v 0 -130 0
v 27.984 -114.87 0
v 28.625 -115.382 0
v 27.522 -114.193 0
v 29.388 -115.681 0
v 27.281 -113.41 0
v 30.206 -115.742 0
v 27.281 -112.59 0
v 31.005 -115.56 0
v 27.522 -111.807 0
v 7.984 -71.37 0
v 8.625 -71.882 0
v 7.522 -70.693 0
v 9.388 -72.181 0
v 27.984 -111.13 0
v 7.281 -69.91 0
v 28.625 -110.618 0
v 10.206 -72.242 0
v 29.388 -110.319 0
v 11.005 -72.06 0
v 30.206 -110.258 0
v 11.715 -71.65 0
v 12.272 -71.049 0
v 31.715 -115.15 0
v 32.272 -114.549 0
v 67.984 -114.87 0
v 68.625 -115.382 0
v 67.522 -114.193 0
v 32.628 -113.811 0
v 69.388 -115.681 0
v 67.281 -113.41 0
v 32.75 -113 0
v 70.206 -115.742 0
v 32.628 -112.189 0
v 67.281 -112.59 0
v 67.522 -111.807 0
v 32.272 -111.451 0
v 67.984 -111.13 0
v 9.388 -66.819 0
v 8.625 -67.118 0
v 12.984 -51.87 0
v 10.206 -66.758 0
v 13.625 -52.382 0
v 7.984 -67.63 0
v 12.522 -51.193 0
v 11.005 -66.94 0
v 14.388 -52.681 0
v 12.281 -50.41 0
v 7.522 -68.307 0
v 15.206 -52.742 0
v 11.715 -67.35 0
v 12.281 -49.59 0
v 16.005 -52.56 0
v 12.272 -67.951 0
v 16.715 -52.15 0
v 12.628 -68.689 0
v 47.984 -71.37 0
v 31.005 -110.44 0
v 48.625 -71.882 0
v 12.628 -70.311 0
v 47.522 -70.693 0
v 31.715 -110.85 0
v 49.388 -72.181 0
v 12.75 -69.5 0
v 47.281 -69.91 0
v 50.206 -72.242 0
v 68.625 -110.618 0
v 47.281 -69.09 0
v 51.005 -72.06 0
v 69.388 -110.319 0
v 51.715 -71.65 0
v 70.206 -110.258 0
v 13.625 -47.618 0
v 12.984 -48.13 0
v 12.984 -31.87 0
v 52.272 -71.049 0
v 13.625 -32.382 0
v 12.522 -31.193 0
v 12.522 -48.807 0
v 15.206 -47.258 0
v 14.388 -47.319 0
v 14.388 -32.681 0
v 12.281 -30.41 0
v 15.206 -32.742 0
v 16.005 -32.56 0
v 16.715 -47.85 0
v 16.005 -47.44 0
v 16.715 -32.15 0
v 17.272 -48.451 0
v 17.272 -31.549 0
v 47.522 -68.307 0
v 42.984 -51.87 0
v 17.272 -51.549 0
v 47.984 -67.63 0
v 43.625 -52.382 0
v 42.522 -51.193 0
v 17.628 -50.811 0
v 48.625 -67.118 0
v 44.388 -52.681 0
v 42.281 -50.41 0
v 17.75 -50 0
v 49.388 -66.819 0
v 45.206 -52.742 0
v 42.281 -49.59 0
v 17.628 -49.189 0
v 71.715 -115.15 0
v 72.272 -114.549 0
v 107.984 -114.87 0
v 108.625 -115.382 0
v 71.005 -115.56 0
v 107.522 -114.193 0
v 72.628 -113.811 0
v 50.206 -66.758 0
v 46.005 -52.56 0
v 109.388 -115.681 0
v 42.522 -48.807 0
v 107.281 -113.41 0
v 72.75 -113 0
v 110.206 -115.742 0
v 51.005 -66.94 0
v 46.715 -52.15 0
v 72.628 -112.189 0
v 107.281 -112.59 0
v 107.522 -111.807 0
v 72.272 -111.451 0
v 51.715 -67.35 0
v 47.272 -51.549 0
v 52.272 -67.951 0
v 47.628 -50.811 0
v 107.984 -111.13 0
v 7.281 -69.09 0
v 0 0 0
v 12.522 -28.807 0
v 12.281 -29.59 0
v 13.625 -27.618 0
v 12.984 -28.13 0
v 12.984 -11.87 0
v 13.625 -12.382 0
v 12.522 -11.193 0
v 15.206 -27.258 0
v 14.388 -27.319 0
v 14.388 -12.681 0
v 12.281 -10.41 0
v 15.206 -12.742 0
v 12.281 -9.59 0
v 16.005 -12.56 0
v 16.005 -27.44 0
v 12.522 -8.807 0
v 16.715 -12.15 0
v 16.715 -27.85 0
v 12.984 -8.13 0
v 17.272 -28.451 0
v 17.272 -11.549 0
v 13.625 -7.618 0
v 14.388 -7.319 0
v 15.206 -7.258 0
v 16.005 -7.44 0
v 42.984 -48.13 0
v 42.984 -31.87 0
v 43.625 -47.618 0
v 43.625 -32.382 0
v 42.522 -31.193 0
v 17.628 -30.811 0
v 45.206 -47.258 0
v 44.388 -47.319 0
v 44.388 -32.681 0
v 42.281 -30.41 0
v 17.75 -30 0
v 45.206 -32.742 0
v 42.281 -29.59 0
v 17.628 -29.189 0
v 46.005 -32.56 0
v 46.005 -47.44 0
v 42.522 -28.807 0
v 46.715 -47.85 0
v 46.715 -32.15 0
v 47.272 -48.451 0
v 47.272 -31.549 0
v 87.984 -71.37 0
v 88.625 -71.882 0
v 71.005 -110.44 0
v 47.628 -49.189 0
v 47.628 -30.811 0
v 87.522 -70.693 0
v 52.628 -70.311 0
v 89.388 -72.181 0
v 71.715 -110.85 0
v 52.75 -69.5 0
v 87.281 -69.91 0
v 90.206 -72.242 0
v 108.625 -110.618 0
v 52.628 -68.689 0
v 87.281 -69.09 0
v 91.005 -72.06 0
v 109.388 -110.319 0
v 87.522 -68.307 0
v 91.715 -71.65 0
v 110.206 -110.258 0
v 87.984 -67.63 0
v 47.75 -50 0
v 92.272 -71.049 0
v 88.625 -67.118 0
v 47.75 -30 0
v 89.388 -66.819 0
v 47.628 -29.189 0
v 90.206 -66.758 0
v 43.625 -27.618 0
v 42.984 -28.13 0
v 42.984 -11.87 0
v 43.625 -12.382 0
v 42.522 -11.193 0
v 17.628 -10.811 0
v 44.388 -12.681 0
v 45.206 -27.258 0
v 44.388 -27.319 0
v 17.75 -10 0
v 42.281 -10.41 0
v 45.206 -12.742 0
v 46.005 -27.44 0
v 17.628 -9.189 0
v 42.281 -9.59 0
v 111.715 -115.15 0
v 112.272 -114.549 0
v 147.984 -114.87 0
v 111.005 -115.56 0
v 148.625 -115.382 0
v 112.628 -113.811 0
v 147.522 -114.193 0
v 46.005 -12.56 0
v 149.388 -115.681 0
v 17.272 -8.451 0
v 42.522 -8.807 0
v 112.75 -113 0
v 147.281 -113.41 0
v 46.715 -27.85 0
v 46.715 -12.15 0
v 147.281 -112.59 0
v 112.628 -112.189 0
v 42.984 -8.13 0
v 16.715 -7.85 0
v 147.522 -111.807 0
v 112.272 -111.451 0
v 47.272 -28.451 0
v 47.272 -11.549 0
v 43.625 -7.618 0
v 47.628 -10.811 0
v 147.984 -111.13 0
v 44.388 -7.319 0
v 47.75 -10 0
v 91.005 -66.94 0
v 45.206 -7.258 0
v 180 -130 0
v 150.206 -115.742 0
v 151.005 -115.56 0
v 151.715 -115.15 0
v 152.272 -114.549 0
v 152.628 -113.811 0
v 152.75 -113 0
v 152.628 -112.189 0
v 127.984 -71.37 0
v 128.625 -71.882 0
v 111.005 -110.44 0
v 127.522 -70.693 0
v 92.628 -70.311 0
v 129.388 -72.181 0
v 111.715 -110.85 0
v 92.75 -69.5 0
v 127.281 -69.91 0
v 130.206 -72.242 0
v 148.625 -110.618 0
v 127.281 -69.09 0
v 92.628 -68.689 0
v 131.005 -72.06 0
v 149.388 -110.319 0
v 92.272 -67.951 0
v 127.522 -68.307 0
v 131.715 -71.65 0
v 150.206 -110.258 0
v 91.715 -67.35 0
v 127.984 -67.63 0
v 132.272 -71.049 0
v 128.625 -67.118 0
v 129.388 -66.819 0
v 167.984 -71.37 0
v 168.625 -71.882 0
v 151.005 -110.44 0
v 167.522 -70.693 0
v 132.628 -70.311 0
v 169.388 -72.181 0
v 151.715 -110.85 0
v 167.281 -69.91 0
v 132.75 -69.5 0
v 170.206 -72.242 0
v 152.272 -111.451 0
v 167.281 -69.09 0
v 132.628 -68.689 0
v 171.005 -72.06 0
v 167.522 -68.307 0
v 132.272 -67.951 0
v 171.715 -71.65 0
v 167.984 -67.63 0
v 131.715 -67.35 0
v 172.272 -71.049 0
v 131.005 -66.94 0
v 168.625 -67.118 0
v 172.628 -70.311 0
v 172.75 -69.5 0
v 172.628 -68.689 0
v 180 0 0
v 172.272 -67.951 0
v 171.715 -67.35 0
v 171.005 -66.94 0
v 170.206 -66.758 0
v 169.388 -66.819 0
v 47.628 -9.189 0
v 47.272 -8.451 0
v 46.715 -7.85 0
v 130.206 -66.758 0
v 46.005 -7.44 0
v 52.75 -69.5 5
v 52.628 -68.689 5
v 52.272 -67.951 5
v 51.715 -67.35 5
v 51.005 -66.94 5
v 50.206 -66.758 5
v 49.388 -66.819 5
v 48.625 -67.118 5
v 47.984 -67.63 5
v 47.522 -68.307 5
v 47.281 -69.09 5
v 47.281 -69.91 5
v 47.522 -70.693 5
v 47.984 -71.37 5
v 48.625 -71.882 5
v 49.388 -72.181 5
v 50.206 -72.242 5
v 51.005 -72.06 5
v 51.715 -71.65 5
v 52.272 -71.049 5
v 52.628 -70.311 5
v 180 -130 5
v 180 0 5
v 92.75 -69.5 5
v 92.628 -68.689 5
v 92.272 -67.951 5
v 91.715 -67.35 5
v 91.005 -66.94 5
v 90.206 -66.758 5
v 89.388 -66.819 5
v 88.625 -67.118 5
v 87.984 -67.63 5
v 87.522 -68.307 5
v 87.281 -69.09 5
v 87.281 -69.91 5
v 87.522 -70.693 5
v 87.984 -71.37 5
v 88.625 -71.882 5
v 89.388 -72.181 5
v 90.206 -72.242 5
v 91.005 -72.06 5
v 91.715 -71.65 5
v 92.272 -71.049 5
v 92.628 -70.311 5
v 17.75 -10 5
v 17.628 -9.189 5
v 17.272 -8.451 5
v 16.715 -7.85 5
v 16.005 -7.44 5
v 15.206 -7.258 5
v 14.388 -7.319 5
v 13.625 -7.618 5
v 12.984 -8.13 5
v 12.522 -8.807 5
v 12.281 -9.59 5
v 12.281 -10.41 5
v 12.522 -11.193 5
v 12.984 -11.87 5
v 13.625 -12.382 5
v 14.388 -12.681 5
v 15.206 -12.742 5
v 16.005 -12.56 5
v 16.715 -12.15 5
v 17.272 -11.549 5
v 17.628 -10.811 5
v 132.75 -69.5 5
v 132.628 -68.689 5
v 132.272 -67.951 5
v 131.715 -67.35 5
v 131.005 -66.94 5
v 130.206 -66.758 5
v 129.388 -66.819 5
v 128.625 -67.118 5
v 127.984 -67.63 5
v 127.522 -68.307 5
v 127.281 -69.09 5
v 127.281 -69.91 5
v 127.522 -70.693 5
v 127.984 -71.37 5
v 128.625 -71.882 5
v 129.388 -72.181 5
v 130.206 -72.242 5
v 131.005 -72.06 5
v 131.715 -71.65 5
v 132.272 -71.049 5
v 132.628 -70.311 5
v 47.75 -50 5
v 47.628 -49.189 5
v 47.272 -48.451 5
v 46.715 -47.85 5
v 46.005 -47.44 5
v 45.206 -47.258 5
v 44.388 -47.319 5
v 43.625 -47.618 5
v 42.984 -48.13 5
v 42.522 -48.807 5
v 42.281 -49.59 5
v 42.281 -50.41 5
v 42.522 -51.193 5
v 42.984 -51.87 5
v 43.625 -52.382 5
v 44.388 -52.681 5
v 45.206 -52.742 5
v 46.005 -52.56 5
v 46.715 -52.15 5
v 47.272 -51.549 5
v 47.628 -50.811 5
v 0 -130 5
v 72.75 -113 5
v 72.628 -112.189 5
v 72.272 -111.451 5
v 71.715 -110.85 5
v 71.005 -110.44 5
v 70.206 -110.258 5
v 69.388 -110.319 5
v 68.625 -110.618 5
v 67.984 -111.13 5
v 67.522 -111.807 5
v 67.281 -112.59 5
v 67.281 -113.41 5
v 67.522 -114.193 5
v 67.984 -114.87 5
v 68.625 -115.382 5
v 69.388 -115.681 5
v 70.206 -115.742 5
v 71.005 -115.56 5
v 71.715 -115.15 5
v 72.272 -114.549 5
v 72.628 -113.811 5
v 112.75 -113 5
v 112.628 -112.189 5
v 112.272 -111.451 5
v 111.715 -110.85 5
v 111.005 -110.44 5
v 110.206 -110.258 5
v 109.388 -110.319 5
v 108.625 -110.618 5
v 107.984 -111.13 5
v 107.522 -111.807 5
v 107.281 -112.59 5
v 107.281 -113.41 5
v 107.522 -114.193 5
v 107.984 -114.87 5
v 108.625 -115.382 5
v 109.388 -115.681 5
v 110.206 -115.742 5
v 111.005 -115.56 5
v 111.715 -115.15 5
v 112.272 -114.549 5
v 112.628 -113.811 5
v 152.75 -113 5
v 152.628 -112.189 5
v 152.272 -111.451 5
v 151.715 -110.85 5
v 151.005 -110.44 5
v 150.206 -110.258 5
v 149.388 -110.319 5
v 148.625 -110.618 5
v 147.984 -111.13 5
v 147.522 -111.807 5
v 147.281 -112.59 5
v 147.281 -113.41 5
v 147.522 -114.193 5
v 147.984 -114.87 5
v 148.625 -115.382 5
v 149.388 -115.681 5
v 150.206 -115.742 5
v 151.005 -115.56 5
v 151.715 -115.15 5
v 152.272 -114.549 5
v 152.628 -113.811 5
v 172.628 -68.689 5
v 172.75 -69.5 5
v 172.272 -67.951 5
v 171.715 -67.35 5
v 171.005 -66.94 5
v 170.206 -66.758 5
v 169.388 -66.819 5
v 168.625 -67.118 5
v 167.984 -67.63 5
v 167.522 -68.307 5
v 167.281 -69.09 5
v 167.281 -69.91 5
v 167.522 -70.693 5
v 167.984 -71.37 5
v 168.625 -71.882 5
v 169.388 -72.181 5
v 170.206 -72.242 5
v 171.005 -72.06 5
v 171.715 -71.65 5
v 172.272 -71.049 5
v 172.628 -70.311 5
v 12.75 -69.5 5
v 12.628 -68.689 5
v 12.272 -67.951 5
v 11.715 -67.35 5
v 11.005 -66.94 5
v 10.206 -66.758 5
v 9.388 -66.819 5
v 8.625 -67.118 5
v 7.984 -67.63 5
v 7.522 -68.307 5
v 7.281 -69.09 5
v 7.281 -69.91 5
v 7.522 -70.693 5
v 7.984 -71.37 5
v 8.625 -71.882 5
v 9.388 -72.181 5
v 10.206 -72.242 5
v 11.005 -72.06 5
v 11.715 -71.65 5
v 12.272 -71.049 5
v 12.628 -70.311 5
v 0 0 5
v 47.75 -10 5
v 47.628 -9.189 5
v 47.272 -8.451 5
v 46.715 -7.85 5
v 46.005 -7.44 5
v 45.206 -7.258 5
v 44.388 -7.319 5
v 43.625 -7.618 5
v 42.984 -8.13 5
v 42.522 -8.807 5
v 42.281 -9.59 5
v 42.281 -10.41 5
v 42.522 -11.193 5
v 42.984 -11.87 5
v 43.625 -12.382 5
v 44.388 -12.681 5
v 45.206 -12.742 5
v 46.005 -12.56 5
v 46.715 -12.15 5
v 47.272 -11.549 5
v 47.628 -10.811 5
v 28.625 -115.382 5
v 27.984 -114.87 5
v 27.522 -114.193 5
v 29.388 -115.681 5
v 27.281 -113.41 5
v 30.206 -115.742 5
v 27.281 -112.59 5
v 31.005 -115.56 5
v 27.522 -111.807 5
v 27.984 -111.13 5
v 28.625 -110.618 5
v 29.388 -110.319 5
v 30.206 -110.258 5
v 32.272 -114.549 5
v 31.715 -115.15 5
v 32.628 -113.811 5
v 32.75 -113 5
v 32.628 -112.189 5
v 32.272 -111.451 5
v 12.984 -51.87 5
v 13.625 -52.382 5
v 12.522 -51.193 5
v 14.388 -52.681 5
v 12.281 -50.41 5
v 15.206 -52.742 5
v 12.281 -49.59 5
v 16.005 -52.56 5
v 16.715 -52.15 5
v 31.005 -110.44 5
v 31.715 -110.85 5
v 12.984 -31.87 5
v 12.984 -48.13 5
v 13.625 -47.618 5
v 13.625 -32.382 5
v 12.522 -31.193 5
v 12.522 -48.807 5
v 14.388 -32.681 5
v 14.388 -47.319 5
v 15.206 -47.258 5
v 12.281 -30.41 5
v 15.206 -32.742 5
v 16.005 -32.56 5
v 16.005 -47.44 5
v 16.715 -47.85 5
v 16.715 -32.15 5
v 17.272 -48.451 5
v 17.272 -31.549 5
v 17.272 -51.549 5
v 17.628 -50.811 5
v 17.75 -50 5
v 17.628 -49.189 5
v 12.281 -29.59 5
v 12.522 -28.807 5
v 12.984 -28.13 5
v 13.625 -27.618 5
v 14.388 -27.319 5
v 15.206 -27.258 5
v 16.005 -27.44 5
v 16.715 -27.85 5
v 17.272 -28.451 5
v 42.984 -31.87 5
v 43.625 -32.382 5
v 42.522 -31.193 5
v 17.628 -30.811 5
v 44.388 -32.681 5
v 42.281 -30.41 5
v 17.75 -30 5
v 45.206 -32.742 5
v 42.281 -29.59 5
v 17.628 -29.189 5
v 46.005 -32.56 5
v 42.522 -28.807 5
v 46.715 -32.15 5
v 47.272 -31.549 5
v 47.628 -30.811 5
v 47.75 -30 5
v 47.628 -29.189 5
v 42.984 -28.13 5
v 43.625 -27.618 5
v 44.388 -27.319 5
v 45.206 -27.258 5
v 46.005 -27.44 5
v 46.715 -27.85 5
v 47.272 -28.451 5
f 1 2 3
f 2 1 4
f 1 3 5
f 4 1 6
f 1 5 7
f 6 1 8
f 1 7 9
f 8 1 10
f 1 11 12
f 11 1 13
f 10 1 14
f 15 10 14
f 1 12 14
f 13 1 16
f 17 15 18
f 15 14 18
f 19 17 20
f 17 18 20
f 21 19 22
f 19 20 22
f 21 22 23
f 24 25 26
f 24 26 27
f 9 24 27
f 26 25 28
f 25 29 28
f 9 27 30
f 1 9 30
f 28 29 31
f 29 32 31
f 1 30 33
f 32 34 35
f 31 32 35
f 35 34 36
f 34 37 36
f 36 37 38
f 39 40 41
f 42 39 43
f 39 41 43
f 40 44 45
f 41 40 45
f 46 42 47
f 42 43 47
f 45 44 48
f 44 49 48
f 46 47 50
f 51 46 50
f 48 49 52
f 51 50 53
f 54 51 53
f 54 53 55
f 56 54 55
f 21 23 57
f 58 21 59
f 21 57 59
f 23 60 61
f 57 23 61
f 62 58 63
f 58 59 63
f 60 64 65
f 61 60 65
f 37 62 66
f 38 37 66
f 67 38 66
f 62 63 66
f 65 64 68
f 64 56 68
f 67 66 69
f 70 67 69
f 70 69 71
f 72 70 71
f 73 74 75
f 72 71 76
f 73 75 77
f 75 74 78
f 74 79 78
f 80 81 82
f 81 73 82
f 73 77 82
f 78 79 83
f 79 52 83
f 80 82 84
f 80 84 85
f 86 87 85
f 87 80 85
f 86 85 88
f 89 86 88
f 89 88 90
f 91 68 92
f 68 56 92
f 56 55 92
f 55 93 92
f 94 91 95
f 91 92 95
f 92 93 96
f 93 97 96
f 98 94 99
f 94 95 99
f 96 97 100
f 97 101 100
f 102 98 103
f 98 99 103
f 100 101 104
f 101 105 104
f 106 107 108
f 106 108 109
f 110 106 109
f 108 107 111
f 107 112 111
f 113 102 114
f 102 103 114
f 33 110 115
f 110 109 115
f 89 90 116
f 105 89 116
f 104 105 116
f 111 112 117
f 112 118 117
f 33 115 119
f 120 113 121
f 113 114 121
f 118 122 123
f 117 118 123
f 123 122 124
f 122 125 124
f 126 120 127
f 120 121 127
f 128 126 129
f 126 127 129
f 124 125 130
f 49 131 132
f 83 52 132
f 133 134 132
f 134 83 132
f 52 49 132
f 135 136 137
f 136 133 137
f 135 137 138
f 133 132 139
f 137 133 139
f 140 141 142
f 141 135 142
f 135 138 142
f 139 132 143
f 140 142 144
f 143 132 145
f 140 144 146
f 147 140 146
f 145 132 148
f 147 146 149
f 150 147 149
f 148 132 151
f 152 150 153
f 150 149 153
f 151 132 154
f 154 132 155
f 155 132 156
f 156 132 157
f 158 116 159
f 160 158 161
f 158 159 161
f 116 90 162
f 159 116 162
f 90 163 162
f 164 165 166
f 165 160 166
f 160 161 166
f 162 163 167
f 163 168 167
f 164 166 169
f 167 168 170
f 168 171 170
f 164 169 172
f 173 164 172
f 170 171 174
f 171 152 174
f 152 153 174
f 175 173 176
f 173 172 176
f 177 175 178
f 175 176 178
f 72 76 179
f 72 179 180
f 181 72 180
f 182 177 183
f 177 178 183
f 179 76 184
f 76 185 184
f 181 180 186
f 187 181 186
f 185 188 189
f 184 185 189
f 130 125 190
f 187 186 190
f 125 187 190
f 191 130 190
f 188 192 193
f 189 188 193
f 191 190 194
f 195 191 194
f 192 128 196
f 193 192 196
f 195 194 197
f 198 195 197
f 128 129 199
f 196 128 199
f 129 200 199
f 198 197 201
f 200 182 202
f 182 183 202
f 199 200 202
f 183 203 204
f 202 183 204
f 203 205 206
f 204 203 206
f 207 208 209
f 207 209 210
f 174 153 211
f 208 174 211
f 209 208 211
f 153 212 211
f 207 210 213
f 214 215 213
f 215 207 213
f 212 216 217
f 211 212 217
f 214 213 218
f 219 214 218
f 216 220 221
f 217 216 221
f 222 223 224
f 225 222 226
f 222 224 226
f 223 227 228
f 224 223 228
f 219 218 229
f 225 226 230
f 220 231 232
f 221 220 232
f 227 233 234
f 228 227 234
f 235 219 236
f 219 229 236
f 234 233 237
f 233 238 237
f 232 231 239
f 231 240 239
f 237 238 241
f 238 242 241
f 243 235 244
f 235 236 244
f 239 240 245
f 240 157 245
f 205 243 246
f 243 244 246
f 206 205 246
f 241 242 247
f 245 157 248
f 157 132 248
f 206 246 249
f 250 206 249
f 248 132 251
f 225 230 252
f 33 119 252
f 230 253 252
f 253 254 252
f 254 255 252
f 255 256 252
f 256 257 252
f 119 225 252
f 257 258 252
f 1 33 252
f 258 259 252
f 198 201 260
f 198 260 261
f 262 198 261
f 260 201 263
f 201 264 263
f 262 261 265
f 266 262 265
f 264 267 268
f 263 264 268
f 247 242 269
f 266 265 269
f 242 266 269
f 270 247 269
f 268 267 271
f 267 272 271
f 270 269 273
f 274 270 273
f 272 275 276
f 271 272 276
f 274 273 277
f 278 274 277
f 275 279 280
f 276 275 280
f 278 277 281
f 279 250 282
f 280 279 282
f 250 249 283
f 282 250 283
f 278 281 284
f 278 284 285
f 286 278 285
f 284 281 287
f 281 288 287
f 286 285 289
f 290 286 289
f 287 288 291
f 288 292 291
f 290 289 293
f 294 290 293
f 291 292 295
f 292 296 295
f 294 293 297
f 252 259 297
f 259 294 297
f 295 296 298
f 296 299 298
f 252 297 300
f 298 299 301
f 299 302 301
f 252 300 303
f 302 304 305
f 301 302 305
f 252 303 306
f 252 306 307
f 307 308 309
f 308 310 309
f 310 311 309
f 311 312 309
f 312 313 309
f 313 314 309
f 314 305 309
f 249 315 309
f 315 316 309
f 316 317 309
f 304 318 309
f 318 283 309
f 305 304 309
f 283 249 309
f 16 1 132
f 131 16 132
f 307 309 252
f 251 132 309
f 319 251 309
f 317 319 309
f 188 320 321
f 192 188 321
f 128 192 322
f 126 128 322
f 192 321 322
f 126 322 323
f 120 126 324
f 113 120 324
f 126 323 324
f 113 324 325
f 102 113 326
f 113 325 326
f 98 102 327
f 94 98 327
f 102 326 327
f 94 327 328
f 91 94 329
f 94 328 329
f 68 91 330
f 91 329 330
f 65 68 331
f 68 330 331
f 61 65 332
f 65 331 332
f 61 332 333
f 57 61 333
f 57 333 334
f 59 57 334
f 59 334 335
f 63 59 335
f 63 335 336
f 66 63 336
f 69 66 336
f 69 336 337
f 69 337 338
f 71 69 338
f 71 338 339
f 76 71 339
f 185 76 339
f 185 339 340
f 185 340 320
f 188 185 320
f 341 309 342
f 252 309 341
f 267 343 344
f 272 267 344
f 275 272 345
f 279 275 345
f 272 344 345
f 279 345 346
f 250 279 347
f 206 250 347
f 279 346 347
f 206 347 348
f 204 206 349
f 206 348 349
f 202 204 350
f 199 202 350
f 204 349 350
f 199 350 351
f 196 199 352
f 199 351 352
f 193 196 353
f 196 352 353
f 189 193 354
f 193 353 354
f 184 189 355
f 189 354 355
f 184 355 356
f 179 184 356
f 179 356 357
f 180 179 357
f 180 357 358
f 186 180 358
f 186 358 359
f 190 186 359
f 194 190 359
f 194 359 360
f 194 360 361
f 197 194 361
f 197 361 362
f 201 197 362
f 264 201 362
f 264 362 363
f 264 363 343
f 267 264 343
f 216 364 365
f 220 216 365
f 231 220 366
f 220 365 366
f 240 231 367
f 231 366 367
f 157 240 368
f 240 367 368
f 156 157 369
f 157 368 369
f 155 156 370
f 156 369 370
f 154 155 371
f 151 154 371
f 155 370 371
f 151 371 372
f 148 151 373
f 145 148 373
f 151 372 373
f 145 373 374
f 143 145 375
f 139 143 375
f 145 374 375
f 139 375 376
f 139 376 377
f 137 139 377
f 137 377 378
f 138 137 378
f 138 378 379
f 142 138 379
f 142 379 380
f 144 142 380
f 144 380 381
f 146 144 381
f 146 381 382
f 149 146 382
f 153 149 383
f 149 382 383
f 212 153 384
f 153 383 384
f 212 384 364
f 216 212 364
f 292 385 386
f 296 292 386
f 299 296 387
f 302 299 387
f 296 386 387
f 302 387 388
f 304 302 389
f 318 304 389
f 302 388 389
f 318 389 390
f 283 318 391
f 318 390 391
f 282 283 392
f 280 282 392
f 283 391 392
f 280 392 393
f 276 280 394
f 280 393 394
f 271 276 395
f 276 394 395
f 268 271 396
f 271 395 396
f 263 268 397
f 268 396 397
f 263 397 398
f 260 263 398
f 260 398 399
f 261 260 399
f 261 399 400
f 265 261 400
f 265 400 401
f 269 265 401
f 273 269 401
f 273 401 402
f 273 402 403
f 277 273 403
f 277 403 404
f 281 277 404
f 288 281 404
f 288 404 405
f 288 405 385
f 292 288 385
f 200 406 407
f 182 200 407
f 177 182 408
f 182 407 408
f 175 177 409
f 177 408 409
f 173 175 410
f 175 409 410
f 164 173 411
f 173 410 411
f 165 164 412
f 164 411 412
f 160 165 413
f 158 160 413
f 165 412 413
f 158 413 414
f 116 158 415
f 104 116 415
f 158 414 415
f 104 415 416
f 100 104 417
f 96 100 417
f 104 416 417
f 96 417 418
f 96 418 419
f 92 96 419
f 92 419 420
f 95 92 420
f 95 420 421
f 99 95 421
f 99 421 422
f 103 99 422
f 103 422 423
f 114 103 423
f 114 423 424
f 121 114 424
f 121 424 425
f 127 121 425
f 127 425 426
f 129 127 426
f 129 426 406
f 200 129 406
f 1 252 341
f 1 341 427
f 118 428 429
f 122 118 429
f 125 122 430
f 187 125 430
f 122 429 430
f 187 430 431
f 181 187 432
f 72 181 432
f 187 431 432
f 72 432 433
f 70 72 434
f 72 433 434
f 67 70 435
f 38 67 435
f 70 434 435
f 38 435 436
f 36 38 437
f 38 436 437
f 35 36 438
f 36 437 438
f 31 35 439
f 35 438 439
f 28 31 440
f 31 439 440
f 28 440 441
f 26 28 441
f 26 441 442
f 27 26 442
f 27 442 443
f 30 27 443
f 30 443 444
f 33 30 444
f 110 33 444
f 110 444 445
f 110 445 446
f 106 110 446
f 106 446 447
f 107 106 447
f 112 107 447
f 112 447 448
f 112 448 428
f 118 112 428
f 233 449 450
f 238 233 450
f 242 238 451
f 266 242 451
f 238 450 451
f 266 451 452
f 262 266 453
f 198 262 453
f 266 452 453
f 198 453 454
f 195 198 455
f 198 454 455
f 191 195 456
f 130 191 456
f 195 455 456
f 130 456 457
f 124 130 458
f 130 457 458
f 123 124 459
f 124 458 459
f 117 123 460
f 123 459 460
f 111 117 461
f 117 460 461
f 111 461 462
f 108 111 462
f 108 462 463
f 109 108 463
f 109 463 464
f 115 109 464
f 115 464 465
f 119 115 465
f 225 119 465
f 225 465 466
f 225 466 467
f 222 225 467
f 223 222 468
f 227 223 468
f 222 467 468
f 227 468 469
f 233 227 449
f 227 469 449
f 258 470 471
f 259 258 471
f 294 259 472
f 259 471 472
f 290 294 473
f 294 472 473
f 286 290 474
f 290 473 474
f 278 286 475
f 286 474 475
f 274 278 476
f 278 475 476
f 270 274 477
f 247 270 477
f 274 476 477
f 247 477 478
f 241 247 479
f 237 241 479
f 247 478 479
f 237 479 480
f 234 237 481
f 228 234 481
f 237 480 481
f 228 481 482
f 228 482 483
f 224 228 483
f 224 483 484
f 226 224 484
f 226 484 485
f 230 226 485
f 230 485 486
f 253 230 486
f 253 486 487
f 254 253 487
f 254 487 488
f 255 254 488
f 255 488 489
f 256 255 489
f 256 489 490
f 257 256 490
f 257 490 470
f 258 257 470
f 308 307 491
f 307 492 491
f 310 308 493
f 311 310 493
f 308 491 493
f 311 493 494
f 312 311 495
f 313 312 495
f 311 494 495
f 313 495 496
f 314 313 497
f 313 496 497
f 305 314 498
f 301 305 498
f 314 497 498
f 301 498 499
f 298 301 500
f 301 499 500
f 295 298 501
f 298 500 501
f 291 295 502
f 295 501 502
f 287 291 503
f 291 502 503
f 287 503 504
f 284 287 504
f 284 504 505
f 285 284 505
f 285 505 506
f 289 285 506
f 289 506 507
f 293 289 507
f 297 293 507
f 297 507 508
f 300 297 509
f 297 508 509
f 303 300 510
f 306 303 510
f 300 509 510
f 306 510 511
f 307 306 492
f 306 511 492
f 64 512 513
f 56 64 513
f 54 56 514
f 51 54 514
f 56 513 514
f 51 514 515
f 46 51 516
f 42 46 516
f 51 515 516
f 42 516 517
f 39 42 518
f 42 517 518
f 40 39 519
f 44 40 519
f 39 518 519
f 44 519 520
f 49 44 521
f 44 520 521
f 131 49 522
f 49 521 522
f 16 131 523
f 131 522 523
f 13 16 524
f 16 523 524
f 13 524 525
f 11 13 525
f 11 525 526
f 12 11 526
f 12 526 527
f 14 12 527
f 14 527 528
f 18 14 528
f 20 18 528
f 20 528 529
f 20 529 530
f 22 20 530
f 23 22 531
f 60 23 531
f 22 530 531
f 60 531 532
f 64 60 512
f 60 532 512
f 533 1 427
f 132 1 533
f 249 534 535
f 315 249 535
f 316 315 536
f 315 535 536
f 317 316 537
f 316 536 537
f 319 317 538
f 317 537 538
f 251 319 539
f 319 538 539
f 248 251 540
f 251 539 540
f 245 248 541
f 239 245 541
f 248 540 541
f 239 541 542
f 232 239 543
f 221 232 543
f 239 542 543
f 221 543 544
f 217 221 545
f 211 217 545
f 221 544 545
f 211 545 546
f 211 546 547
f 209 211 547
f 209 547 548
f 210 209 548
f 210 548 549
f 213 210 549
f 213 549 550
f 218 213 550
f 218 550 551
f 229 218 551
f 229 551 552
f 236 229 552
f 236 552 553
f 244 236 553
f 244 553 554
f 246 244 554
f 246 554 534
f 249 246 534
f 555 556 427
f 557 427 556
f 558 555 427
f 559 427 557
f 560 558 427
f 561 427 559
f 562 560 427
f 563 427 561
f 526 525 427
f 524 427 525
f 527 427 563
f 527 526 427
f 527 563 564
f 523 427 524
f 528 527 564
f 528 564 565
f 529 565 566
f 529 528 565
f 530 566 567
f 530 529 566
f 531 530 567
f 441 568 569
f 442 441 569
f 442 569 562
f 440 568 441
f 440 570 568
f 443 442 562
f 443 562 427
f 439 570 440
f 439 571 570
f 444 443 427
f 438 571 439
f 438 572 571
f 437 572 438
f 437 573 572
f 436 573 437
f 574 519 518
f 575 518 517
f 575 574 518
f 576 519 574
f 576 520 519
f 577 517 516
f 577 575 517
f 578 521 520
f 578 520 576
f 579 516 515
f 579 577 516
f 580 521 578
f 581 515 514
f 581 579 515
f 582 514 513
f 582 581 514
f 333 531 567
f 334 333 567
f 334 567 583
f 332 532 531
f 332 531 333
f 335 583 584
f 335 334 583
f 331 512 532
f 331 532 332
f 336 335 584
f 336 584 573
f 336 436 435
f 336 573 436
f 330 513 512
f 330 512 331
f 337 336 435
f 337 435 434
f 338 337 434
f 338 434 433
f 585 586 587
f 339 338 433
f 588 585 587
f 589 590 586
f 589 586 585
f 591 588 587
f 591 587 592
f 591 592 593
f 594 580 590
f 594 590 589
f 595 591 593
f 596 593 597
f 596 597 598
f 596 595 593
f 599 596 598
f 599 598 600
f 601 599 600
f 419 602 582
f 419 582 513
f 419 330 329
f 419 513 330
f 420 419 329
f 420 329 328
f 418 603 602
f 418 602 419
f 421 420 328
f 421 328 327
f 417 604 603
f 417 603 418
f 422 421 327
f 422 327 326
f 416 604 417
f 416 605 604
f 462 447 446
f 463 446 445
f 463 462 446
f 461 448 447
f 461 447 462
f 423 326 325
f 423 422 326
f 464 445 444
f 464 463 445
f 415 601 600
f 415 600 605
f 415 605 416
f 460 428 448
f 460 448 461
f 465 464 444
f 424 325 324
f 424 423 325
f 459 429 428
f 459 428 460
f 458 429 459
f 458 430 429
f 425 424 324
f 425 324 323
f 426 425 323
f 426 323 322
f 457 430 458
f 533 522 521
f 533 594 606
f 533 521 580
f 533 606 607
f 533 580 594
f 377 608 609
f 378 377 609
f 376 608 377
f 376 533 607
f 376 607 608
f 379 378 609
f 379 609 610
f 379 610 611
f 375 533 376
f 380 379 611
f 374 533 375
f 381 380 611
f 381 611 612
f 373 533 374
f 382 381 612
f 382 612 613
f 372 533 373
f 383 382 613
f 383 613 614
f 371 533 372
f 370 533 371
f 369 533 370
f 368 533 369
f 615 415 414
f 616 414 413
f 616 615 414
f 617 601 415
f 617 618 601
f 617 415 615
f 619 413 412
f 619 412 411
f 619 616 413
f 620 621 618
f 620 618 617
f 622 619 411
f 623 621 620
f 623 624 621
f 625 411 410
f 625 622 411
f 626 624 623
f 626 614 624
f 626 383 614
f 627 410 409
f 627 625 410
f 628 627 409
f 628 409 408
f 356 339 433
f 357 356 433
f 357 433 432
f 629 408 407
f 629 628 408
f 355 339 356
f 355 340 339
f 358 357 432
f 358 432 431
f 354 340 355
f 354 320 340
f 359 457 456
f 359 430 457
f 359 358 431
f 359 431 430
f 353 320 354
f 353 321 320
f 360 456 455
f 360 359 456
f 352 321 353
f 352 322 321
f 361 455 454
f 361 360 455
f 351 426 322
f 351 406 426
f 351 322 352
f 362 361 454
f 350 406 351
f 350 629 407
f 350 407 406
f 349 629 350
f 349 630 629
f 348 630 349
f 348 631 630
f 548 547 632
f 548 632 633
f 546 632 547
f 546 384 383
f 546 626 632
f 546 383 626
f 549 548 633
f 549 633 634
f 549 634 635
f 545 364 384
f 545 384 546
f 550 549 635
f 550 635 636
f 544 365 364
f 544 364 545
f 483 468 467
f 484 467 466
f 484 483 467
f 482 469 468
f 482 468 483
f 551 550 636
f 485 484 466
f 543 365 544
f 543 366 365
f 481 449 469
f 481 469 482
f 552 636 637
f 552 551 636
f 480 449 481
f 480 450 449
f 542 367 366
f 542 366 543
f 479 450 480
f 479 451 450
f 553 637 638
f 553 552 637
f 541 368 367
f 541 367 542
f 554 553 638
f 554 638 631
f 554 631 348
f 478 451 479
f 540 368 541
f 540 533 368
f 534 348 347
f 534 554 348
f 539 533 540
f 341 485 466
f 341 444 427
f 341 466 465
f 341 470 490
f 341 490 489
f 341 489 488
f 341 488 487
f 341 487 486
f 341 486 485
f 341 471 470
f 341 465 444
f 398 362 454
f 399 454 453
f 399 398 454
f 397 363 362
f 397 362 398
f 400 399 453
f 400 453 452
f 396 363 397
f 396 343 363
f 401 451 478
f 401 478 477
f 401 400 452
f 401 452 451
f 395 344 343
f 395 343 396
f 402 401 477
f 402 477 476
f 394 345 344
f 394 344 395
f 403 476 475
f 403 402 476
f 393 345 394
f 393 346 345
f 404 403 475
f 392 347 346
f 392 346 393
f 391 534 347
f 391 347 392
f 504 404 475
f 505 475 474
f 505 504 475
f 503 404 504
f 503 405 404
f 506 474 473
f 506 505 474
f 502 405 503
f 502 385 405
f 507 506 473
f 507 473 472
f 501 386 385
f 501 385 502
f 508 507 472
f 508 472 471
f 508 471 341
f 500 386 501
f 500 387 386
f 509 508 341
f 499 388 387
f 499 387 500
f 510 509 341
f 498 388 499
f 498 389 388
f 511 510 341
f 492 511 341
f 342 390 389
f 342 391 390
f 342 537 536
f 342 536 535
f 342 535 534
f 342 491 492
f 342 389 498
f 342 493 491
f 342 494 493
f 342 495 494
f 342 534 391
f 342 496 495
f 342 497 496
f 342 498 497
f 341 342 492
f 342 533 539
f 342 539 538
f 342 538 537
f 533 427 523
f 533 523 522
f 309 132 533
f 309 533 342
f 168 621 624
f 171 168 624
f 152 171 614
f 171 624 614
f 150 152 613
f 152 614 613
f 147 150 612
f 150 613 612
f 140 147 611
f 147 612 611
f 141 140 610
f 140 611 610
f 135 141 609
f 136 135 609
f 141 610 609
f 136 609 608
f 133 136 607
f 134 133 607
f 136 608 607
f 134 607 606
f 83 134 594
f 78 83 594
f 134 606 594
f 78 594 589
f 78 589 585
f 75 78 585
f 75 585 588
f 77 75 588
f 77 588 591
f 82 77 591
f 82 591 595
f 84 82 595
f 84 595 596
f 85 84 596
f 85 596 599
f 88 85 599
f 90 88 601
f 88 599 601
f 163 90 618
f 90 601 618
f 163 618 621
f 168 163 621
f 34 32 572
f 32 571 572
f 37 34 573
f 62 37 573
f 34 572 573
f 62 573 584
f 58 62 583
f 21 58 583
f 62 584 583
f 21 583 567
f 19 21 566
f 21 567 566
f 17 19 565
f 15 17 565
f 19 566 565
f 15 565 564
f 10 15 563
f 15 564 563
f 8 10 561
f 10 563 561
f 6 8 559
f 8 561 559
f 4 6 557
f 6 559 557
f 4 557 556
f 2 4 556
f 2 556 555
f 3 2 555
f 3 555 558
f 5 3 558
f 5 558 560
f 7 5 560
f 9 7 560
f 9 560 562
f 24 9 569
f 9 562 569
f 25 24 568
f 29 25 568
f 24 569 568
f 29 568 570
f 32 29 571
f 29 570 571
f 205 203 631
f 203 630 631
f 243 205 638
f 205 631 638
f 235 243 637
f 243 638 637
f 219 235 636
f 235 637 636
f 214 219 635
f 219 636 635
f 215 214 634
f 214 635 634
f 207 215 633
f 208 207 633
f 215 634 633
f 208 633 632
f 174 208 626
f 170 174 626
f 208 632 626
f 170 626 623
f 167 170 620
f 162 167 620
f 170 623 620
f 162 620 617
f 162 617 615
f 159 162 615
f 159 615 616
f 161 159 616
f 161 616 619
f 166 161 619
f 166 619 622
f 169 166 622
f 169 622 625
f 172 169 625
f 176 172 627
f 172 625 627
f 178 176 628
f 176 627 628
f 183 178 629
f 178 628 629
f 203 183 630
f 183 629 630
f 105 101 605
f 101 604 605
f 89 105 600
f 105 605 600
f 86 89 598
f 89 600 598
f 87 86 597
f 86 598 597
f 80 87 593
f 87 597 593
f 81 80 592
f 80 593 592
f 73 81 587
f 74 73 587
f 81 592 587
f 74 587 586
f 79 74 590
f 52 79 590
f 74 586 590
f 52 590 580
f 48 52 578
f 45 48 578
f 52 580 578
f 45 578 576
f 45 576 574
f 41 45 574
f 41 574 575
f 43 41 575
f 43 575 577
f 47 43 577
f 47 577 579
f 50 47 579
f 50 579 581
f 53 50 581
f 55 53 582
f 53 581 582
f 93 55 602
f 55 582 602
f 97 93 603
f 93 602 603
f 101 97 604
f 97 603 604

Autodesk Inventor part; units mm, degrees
ref_plane "YZ Plane" through (0, 0, 0) normal (1, 0, 0) x (0, 1, 0)
ref_plane "XZ Plane" through (0, 0, 0) normal (0, 1, 0) x (-1, 0, 0)
ref_plane "XY Plane" through (0, 0, 0) normal (0, 0, 1) x (1, 0, 0)
sketch "Sketch1" plane through (0, 0, 0) normal (0, 0, 1) x (1, 0, 0)
  line L0 (0, 0) -> (180, 0)
  line L1 (180, 0) -> (180, -130)
  line L2 (180, -130) -> (0, -130)
  line L3 (0, -130) -> (0, 0)
  dimension "d0" = 180
  dimension "d1" = 130
extrude "Extrusion1" add sketch "Sketch1" along normal blind 5
sketch "Sketch2" plane through (0, 0, 5) normal (0, 0, 1) x (1, 0, 0)
  line L0 (0, -130) -> (180, -130) projected
  line L1 (180, -130) -> (150, -130)
  line L2 (150, -130) -> (150, -113)
  circle A0 centre (150, -113) radius 2.75
  line L3 (180, -130) -> (180, 0) projected
  line L4 (180, -69.5) -> (170, -69.5)
  line L5 (180, -69.5) -> (190, -69.5) construction
  circle A1 centre (170, -69.5) radius 2.75
  circle A2 centre (130, -69.5) radius 2.75
  circle A3 centre (90, -69.5) radius 2.75
  circle A4 centre (50, -69.5) radius 2.75
  circle A5 centre (10, -69.5) radius 2.75
  circle A6 centre (110, -113) radius 2.75
  circle A7 centre (70, -113) radius 2.75
  circle A8 centre (30, -113) radius 2.75
  point P0 (0, 0)
  dimension "d4" = 30
  dimension "d6" = 5.5
  dimension "d25" = 10
  dimension "d26" = 180
  dimension "d33" = 5.5
  dimension "d34" = 5.5
  dimension "d35" = 5.5
  dimension "d37" = 5.5
  dimension "d53" = 43.5
  dimension "d56" = 40
extrude "Extrusion2" cut sketch "Sketch2" against normal blind 5
sketch "Sketch3" plane through (0, 0, 5) normal (0, 0, 1) x (1, 0, 0)
  line L0 (0, 0) -> (180, 0) projected
  line L1 (0, 0) -> (15, 0)
  line L2 (15, 0) -> (15, -10)
  circle A0 centre (15, -10) radius 2.75
  line L3 (15, -10) -> (15, -30)
  line L4 (15, -30) -> (15, -50)
  circle A1 centre (15, -30) radius 2.75
  circle A2 centre (15, -50) radius 2.75
  line L5 (15, -10) -> (45, -10)
  line L6 (45, -10) -> (45, -30)
  line L7 (45, -30) -> (45, -50)
  circle A3 centre (45, -10) radius 2.75
  circle A4 centre (45, -30) radius 2.75
  circle A5 centre (45, -50) radius 2.75
  dimension "d40" = 15
  dimension "d41" = 10
  dimension "d42" = 5.5
  dimension "d43" = 20
  dimension "d44" = 20
  dimension "d45" = 5.5
  dimension "d46" = 5.5
  dimension "d47" = 30
  dimension "d48" = 5.5
  dimension "d49" = 5.5
  dimension "d50" = 5.5
extrude "Extrusion3" cut sketch "Sketch3" against normal blind 5
properties part number "GantryPlate_v3"
